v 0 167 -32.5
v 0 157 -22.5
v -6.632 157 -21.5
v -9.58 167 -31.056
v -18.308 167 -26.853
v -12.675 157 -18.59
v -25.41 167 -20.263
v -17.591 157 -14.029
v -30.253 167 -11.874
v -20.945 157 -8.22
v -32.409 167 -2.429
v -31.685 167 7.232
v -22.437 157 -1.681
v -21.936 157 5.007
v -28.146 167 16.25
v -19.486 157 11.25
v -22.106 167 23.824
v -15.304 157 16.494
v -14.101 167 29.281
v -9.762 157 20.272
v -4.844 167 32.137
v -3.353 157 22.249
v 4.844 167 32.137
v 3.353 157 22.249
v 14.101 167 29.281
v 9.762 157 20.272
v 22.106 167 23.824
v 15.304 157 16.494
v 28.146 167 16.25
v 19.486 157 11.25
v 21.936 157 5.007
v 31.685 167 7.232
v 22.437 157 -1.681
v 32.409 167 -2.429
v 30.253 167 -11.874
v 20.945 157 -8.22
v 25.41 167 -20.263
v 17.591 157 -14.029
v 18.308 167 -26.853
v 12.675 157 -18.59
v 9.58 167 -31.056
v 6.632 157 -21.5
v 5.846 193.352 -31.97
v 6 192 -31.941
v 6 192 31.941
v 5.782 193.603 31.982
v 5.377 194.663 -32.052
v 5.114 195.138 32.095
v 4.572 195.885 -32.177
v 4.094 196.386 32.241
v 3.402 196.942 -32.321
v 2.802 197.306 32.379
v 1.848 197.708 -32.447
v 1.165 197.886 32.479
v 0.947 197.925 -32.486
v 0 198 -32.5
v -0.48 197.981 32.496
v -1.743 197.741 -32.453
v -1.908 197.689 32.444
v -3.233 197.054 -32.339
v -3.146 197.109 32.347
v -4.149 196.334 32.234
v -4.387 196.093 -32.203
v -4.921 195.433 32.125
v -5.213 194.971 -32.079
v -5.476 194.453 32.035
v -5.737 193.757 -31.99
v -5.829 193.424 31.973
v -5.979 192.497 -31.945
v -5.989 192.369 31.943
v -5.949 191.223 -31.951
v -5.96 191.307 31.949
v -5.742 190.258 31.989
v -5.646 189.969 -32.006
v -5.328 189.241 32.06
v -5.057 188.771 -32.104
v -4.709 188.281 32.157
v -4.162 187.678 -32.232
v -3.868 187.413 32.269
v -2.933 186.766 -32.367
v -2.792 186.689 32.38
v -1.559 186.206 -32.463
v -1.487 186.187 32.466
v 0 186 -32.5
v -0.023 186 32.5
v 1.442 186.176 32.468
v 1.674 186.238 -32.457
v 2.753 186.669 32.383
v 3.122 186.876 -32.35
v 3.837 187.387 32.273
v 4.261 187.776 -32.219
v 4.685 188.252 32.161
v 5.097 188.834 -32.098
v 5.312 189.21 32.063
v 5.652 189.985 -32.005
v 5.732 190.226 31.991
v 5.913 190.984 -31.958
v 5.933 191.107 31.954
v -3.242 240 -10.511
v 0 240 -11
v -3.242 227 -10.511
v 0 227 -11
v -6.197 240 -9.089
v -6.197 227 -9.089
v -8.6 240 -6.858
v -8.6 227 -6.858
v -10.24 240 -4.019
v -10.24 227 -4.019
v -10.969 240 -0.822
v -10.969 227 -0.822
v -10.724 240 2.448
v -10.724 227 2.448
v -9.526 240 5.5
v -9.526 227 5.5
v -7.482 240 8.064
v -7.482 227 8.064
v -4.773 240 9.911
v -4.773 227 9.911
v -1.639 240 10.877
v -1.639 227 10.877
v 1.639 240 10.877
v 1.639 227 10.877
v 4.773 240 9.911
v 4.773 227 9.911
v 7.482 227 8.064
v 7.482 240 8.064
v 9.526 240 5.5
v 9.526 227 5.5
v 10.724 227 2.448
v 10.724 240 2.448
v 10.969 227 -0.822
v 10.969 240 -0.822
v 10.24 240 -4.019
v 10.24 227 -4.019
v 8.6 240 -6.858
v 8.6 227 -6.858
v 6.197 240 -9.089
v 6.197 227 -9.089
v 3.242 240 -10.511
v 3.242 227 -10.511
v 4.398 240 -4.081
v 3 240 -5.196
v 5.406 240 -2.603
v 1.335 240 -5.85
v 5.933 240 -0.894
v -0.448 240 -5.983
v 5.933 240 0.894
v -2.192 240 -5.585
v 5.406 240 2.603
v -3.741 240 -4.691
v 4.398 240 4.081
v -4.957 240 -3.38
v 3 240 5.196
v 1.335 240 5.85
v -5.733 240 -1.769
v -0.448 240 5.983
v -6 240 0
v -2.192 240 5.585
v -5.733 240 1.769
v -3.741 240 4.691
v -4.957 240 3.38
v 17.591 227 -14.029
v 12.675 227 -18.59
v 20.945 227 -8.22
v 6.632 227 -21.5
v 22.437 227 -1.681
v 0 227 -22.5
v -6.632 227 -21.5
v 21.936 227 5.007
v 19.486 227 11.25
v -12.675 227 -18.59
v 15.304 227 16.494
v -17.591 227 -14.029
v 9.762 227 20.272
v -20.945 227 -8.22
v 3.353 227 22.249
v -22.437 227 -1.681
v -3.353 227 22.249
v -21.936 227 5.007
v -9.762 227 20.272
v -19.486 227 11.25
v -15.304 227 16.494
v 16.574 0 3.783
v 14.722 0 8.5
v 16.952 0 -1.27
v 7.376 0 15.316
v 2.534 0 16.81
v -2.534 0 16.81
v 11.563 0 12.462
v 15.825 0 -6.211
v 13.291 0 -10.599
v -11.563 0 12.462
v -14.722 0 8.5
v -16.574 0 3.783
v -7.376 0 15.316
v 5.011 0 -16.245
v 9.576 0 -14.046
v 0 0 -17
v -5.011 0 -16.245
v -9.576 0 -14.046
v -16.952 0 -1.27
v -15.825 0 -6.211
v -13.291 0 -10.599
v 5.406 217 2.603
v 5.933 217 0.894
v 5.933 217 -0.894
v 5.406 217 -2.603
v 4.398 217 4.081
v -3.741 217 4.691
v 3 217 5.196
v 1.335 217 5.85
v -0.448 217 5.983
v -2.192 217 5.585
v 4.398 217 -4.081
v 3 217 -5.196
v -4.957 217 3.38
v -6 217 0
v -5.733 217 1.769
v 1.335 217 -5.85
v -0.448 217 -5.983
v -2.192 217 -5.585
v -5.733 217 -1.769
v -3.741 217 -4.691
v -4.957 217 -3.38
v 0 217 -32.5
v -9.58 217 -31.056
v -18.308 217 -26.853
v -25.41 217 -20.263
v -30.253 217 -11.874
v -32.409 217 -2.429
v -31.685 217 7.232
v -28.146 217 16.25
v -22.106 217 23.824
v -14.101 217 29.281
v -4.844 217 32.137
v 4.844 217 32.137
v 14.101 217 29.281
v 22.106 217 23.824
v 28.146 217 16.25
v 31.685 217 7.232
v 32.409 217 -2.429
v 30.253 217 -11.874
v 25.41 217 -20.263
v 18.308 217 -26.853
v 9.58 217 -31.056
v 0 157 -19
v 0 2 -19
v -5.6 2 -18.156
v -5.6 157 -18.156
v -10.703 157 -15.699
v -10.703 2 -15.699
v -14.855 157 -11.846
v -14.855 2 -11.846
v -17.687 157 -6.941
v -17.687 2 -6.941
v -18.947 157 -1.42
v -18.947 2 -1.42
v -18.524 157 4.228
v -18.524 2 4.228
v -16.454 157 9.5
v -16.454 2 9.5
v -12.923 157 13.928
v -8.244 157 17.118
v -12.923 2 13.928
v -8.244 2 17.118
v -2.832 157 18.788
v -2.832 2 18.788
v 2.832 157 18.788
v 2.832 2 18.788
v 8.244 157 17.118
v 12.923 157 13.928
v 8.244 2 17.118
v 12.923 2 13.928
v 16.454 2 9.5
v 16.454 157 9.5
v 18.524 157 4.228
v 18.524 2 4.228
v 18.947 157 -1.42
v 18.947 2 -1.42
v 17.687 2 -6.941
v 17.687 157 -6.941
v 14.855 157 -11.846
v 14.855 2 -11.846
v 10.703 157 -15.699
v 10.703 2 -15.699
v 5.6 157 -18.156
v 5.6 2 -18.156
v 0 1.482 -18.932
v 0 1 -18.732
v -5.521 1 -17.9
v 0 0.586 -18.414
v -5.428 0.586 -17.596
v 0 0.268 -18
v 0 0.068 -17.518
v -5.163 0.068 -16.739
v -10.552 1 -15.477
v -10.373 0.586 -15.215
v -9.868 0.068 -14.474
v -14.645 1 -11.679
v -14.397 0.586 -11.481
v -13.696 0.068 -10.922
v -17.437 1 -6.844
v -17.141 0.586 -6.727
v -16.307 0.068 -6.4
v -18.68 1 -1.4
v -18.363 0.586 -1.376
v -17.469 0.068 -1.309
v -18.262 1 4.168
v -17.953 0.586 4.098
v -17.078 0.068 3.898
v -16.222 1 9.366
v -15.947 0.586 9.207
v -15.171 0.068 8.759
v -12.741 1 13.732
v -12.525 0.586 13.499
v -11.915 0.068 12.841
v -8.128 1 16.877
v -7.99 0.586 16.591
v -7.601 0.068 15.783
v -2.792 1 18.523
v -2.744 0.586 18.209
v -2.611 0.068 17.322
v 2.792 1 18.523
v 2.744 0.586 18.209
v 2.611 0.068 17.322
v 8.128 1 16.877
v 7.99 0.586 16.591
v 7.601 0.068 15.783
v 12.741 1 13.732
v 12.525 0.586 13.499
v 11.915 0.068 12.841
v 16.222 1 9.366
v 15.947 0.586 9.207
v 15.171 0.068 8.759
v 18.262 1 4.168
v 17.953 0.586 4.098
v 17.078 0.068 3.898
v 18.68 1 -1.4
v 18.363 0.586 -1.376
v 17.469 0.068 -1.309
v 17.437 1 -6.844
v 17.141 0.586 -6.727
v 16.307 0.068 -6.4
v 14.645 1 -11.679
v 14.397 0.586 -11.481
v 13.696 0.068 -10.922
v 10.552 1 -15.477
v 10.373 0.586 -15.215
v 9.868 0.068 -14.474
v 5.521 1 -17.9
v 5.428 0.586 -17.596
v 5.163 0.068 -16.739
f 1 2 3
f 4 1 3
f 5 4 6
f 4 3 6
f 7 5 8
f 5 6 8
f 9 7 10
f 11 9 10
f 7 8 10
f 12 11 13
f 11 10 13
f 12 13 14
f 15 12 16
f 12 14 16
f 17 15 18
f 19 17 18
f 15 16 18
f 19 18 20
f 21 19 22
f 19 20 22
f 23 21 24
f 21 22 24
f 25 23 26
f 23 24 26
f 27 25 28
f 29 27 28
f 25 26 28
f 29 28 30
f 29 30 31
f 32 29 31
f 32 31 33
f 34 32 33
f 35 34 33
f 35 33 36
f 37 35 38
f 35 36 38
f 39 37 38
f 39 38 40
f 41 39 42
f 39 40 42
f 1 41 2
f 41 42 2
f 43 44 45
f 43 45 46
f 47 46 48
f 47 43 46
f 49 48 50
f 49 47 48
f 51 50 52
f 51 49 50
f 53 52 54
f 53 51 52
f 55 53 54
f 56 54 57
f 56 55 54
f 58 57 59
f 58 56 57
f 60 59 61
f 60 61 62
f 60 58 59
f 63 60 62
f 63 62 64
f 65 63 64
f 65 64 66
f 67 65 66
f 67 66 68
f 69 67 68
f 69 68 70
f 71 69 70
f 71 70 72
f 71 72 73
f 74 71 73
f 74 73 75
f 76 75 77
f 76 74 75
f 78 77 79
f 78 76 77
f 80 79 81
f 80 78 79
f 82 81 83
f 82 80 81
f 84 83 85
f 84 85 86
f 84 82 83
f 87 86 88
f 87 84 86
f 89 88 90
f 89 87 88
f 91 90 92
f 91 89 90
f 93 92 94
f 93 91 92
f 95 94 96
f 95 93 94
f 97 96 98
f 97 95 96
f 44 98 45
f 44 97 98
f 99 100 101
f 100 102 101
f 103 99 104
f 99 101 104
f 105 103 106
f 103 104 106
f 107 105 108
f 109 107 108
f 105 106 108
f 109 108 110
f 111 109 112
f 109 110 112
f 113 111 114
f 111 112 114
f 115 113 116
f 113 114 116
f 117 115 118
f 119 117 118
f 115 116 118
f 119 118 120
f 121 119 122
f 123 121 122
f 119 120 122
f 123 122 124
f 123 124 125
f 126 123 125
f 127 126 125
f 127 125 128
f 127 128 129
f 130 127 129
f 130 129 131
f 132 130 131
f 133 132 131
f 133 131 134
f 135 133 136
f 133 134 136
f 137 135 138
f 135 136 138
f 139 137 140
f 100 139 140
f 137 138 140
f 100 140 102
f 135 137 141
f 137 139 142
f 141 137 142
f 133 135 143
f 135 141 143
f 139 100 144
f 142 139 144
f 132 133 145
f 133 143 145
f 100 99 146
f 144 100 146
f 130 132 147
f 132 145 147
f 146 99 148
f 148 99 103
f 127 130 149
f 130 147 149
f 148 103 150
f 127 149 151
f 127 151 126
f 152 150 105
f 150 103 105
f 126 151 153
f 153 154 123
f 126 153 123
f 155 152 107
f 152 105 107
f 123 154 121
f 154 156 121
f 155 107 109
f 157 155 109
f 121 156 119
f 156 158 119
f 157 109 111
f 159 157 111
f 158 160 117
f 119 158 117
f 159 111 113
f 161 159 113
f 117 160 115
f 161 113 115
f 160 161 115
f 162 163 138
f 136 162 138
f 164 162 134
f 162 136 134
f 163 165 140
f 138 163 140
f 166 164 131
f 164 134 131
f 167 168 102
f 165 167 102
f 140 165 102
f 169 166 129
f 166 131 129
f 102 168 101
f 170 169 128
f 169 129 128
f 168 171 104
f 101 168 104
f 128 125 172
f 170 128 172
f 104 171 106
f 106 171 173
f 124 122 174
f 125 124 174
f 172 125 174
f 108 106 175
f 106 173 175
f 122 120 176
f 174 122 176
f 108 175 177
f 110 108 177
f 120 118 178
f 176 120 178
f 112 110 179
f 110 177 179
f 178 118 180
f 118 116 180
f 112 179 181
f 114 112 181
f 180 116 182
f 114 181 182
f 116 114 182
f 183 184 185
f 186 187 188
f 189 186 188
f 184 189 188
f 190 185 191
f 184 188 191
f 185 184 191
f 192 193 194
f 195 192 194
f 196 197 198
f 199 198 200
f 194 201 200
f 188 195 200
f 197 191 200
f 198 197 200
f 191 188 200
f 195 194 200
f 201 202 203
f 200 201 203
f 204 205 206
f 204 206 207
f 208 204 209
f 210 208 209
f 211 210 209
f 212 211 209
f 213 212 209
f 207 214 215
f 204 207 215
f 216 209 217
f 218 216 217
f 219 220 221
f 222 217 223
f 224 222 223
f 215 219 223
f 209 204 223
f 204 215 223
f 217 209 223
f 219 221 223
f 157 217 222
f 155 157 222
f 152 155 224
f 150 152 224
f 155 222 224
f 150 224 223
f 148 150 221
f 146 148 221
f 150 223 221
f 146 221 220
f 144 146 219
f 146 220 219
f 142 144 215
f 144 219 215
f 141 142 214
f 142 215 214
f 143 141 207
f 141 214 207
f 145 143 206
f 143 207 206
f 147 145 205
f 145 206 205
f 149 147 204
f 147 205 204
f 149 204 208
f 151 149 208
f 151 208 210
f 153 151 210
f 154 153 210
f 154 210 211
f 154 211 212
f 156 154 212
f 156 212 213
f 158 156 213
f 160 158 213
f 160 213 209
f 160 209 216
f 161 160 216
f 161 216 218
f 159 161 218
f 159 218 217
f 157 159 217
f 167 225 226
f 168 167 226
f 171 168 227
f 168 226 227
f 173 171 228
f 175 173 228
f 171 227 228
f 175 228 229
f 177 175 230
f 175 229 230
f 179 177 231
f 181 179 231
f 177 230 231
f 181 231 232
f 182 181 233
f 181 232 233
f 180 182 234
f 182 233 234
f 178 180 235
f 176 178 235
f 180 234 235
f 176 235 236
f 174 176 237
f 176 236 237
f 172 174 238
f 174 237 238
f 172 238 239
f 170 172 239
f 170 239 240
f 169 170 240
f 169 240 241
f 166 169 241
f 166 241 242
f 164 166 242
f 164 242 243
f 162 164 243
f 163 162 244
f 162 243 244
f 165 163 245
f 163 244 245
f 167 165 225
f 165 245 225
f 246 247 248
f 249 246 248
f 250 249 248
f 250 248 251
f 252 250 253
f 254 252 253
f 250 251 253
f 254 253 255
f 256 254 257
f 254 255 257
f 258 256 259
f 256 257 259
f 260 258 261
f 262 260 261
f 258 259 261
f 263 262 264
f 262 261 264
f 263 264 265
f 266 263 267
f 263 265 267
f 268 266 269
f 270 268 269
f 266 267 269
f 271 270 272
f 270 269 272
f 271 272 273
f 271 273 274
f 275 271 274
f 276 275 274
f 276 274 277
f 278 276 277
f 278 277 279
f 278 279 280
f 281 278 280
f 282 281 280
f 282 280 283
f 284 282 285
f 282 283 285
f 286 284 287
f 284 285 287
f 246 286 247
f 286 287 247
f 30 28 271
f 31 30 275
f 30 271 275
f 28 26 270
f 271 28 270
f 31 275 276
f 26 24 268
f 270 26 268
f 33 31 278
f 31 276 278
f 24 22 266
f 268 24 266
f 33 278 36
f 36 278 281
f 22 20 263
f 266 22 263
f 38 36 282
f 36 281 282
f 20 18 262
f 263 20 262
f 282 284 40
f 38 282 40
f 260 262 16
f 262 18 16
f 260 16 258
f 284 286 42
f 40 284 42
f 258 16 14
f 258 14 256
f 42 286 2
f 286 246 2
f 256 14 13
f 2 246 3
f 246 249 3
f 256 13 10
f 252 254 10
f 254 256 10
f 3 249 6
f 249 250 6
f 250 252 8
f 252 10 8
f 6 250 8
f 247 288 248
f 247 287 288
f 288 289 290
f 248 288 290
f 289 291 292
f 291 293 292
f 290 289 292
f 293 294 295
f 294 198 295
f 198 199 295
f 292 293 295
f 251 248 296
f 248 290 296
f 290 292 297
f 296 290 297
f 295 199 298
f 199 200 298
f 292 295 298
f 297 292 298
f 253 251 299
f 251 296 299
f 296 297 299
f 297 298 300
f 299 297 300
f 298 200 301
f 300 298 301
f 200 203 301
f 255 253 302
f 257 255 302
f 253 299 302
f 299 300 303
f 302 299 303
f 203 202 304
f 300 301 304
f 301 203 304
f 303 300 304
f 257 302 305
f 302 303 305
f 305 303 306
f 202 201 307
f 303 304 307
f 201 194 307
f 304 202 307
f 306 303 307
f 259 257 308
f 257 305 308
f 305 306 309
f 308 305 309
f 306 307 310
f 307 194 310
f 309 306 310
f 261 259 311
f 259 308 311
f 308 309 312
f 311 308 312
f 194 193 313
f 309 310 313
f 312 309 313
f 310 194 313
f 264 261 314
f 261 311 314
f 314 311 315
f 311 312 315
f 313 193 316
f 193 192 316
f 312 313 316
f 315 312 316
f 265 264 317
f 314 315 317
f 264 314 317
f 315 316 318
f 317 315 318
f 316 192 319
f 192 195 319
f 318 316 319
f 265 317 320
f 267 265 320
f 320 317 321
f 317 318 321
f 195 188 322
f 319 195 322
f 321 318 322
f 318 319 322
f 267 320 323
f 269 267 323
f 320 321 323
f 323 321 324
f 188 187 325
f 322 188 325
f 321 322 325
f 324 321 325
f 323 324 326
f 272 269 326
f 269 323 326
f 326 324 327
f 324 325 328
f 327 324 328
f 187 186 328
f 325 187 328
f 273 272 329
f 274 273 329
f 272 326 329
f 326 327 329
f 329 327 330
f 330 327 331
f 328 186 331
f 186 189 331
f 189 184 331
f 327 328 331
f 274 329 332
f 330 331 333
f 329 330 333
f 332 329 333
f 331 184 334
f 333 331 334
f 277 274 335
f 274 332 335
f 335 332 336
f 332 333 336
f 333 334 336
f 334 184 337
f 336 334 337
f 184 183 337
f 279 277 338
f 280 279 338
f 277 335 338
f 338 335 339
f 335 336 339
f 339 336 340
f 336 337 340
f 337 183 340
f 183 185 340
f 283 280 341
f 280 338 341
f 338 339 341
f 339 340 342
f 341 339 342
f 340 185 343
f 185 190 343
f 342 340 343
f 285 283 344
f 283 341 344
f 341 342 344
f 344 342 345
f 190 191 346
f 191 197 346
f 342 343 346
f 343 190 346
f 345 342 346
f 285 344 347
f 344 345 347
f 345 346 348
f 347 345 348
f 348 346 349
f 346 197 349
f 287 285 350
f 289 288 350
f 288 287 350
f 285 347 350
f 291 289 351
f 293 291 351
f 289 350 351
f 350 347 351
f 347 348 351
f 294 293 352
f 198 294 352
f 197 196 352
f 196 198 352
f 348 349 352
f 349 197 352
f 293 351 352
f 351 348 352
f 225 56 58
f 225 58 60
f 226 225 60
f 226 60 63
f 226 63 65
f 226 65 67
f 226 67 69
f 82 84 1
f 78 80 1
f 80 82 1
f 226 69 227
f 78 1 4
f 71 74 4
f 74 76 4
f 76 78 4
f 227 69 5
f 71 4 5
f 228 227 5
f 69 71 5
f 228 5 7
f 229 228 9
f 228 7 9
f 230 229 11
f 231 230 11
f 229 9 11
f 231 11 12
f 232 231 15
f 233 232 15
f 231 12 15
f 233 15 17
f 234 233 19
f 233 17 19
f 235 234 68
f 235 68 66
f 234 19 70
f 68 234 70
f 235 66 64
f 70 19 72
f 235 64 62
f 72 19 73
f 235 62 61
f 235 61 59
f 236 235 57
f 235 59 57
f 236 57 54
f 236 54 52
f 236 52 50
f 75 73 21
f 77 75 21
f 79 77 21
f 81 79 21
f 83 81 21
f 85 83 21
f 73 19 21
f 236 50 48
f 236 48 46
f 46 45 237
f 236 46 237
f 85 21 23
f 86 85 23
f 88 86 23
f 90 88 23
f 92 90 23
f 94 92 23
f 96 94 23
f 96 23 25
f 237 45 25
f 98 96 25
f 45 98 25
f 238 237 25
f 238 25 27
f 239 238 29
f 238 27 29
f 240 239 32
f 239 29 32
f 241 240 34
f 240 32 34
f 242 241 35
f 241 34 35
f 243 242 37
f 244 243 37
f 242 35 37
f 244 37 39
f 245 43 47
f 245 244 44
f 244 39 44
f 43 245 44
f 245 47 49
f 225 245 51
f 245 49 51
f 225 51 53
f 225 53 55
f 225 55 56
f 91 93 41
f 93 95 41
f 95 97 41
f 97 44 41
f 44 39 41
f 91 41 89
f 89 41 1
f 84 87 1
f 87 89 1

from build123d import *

# Parameters (mm, degrees)
CHAMFER1_SIZE           = 10
FILLET1_R               = 2
HOLE1_D                 = 12
HOLE1_DEPTH             = 23
CUT_EXTRUDE1_DEPTH      = 245.361412666
CUT_EXTRUDE1_DEPTH_BACK = 245.361412666
SKETCH4_R               = 6


with BuildPart() as part:
    # Sketch1 → Revolve1 (revolve)
    with BuildSketch(Plane.XY, mode=Mode.PRIVATE) as revolve1_sk:
        Polygon((0, 0), (0, 240), (11, 240), (11, 227), (32.5, 227), (32.5, 157), (19, 157), (19, 0), align=None)
    revolve(revolve1_sk.sketch.rotate(Axis((0, 0, 0), (0, 1, 0)), 90), axis=Axis((0, 0, 0), (0, 1, 0)))

    # Chamfer1
    chamfer1_edges = [part.edges().sort_by_distance(p)[0] for p in [
        (0, 157, 32.5),
        (0, 227, 32.5),
    ]]
    chamfer(chamfer1_edges, length=CHAMFER1_SIZE)

    # Fillet1
    fillet1_edges = [part.edges().sort_by_distance(p)[0] for p in [
        (0, 0, 19),
    ]]
    fillet(fillet1_edges, radius=FILLET1_R)

    # Hole1
    with Locations(Plane(origin=(0, 240, 0), x_dir=(1, 0, 0), z_dir=(0, 1, 0))):
        with Locations((0, 0)):
            Hole(HOLE1_D / 2, depth=HOLE1_DEPTH)

    # Sketch4 → Cut-Extrude1 (cut, two sides: drawn at the far end of the back side and taken through both)
    with BuildSketch(Plane.XY.offset(-CUT_EXTRUDE1_DEPTH_BACK)):
        with Locations((0, 192)):
            Circle(SKETCH4_R)
    extrude(amount=CUT_EXTRUDE1_DEPTH + CUT_EXTRUDE1_DEPTH_BACK, mode=Mode.SUBTRACT)


solid = part.part
